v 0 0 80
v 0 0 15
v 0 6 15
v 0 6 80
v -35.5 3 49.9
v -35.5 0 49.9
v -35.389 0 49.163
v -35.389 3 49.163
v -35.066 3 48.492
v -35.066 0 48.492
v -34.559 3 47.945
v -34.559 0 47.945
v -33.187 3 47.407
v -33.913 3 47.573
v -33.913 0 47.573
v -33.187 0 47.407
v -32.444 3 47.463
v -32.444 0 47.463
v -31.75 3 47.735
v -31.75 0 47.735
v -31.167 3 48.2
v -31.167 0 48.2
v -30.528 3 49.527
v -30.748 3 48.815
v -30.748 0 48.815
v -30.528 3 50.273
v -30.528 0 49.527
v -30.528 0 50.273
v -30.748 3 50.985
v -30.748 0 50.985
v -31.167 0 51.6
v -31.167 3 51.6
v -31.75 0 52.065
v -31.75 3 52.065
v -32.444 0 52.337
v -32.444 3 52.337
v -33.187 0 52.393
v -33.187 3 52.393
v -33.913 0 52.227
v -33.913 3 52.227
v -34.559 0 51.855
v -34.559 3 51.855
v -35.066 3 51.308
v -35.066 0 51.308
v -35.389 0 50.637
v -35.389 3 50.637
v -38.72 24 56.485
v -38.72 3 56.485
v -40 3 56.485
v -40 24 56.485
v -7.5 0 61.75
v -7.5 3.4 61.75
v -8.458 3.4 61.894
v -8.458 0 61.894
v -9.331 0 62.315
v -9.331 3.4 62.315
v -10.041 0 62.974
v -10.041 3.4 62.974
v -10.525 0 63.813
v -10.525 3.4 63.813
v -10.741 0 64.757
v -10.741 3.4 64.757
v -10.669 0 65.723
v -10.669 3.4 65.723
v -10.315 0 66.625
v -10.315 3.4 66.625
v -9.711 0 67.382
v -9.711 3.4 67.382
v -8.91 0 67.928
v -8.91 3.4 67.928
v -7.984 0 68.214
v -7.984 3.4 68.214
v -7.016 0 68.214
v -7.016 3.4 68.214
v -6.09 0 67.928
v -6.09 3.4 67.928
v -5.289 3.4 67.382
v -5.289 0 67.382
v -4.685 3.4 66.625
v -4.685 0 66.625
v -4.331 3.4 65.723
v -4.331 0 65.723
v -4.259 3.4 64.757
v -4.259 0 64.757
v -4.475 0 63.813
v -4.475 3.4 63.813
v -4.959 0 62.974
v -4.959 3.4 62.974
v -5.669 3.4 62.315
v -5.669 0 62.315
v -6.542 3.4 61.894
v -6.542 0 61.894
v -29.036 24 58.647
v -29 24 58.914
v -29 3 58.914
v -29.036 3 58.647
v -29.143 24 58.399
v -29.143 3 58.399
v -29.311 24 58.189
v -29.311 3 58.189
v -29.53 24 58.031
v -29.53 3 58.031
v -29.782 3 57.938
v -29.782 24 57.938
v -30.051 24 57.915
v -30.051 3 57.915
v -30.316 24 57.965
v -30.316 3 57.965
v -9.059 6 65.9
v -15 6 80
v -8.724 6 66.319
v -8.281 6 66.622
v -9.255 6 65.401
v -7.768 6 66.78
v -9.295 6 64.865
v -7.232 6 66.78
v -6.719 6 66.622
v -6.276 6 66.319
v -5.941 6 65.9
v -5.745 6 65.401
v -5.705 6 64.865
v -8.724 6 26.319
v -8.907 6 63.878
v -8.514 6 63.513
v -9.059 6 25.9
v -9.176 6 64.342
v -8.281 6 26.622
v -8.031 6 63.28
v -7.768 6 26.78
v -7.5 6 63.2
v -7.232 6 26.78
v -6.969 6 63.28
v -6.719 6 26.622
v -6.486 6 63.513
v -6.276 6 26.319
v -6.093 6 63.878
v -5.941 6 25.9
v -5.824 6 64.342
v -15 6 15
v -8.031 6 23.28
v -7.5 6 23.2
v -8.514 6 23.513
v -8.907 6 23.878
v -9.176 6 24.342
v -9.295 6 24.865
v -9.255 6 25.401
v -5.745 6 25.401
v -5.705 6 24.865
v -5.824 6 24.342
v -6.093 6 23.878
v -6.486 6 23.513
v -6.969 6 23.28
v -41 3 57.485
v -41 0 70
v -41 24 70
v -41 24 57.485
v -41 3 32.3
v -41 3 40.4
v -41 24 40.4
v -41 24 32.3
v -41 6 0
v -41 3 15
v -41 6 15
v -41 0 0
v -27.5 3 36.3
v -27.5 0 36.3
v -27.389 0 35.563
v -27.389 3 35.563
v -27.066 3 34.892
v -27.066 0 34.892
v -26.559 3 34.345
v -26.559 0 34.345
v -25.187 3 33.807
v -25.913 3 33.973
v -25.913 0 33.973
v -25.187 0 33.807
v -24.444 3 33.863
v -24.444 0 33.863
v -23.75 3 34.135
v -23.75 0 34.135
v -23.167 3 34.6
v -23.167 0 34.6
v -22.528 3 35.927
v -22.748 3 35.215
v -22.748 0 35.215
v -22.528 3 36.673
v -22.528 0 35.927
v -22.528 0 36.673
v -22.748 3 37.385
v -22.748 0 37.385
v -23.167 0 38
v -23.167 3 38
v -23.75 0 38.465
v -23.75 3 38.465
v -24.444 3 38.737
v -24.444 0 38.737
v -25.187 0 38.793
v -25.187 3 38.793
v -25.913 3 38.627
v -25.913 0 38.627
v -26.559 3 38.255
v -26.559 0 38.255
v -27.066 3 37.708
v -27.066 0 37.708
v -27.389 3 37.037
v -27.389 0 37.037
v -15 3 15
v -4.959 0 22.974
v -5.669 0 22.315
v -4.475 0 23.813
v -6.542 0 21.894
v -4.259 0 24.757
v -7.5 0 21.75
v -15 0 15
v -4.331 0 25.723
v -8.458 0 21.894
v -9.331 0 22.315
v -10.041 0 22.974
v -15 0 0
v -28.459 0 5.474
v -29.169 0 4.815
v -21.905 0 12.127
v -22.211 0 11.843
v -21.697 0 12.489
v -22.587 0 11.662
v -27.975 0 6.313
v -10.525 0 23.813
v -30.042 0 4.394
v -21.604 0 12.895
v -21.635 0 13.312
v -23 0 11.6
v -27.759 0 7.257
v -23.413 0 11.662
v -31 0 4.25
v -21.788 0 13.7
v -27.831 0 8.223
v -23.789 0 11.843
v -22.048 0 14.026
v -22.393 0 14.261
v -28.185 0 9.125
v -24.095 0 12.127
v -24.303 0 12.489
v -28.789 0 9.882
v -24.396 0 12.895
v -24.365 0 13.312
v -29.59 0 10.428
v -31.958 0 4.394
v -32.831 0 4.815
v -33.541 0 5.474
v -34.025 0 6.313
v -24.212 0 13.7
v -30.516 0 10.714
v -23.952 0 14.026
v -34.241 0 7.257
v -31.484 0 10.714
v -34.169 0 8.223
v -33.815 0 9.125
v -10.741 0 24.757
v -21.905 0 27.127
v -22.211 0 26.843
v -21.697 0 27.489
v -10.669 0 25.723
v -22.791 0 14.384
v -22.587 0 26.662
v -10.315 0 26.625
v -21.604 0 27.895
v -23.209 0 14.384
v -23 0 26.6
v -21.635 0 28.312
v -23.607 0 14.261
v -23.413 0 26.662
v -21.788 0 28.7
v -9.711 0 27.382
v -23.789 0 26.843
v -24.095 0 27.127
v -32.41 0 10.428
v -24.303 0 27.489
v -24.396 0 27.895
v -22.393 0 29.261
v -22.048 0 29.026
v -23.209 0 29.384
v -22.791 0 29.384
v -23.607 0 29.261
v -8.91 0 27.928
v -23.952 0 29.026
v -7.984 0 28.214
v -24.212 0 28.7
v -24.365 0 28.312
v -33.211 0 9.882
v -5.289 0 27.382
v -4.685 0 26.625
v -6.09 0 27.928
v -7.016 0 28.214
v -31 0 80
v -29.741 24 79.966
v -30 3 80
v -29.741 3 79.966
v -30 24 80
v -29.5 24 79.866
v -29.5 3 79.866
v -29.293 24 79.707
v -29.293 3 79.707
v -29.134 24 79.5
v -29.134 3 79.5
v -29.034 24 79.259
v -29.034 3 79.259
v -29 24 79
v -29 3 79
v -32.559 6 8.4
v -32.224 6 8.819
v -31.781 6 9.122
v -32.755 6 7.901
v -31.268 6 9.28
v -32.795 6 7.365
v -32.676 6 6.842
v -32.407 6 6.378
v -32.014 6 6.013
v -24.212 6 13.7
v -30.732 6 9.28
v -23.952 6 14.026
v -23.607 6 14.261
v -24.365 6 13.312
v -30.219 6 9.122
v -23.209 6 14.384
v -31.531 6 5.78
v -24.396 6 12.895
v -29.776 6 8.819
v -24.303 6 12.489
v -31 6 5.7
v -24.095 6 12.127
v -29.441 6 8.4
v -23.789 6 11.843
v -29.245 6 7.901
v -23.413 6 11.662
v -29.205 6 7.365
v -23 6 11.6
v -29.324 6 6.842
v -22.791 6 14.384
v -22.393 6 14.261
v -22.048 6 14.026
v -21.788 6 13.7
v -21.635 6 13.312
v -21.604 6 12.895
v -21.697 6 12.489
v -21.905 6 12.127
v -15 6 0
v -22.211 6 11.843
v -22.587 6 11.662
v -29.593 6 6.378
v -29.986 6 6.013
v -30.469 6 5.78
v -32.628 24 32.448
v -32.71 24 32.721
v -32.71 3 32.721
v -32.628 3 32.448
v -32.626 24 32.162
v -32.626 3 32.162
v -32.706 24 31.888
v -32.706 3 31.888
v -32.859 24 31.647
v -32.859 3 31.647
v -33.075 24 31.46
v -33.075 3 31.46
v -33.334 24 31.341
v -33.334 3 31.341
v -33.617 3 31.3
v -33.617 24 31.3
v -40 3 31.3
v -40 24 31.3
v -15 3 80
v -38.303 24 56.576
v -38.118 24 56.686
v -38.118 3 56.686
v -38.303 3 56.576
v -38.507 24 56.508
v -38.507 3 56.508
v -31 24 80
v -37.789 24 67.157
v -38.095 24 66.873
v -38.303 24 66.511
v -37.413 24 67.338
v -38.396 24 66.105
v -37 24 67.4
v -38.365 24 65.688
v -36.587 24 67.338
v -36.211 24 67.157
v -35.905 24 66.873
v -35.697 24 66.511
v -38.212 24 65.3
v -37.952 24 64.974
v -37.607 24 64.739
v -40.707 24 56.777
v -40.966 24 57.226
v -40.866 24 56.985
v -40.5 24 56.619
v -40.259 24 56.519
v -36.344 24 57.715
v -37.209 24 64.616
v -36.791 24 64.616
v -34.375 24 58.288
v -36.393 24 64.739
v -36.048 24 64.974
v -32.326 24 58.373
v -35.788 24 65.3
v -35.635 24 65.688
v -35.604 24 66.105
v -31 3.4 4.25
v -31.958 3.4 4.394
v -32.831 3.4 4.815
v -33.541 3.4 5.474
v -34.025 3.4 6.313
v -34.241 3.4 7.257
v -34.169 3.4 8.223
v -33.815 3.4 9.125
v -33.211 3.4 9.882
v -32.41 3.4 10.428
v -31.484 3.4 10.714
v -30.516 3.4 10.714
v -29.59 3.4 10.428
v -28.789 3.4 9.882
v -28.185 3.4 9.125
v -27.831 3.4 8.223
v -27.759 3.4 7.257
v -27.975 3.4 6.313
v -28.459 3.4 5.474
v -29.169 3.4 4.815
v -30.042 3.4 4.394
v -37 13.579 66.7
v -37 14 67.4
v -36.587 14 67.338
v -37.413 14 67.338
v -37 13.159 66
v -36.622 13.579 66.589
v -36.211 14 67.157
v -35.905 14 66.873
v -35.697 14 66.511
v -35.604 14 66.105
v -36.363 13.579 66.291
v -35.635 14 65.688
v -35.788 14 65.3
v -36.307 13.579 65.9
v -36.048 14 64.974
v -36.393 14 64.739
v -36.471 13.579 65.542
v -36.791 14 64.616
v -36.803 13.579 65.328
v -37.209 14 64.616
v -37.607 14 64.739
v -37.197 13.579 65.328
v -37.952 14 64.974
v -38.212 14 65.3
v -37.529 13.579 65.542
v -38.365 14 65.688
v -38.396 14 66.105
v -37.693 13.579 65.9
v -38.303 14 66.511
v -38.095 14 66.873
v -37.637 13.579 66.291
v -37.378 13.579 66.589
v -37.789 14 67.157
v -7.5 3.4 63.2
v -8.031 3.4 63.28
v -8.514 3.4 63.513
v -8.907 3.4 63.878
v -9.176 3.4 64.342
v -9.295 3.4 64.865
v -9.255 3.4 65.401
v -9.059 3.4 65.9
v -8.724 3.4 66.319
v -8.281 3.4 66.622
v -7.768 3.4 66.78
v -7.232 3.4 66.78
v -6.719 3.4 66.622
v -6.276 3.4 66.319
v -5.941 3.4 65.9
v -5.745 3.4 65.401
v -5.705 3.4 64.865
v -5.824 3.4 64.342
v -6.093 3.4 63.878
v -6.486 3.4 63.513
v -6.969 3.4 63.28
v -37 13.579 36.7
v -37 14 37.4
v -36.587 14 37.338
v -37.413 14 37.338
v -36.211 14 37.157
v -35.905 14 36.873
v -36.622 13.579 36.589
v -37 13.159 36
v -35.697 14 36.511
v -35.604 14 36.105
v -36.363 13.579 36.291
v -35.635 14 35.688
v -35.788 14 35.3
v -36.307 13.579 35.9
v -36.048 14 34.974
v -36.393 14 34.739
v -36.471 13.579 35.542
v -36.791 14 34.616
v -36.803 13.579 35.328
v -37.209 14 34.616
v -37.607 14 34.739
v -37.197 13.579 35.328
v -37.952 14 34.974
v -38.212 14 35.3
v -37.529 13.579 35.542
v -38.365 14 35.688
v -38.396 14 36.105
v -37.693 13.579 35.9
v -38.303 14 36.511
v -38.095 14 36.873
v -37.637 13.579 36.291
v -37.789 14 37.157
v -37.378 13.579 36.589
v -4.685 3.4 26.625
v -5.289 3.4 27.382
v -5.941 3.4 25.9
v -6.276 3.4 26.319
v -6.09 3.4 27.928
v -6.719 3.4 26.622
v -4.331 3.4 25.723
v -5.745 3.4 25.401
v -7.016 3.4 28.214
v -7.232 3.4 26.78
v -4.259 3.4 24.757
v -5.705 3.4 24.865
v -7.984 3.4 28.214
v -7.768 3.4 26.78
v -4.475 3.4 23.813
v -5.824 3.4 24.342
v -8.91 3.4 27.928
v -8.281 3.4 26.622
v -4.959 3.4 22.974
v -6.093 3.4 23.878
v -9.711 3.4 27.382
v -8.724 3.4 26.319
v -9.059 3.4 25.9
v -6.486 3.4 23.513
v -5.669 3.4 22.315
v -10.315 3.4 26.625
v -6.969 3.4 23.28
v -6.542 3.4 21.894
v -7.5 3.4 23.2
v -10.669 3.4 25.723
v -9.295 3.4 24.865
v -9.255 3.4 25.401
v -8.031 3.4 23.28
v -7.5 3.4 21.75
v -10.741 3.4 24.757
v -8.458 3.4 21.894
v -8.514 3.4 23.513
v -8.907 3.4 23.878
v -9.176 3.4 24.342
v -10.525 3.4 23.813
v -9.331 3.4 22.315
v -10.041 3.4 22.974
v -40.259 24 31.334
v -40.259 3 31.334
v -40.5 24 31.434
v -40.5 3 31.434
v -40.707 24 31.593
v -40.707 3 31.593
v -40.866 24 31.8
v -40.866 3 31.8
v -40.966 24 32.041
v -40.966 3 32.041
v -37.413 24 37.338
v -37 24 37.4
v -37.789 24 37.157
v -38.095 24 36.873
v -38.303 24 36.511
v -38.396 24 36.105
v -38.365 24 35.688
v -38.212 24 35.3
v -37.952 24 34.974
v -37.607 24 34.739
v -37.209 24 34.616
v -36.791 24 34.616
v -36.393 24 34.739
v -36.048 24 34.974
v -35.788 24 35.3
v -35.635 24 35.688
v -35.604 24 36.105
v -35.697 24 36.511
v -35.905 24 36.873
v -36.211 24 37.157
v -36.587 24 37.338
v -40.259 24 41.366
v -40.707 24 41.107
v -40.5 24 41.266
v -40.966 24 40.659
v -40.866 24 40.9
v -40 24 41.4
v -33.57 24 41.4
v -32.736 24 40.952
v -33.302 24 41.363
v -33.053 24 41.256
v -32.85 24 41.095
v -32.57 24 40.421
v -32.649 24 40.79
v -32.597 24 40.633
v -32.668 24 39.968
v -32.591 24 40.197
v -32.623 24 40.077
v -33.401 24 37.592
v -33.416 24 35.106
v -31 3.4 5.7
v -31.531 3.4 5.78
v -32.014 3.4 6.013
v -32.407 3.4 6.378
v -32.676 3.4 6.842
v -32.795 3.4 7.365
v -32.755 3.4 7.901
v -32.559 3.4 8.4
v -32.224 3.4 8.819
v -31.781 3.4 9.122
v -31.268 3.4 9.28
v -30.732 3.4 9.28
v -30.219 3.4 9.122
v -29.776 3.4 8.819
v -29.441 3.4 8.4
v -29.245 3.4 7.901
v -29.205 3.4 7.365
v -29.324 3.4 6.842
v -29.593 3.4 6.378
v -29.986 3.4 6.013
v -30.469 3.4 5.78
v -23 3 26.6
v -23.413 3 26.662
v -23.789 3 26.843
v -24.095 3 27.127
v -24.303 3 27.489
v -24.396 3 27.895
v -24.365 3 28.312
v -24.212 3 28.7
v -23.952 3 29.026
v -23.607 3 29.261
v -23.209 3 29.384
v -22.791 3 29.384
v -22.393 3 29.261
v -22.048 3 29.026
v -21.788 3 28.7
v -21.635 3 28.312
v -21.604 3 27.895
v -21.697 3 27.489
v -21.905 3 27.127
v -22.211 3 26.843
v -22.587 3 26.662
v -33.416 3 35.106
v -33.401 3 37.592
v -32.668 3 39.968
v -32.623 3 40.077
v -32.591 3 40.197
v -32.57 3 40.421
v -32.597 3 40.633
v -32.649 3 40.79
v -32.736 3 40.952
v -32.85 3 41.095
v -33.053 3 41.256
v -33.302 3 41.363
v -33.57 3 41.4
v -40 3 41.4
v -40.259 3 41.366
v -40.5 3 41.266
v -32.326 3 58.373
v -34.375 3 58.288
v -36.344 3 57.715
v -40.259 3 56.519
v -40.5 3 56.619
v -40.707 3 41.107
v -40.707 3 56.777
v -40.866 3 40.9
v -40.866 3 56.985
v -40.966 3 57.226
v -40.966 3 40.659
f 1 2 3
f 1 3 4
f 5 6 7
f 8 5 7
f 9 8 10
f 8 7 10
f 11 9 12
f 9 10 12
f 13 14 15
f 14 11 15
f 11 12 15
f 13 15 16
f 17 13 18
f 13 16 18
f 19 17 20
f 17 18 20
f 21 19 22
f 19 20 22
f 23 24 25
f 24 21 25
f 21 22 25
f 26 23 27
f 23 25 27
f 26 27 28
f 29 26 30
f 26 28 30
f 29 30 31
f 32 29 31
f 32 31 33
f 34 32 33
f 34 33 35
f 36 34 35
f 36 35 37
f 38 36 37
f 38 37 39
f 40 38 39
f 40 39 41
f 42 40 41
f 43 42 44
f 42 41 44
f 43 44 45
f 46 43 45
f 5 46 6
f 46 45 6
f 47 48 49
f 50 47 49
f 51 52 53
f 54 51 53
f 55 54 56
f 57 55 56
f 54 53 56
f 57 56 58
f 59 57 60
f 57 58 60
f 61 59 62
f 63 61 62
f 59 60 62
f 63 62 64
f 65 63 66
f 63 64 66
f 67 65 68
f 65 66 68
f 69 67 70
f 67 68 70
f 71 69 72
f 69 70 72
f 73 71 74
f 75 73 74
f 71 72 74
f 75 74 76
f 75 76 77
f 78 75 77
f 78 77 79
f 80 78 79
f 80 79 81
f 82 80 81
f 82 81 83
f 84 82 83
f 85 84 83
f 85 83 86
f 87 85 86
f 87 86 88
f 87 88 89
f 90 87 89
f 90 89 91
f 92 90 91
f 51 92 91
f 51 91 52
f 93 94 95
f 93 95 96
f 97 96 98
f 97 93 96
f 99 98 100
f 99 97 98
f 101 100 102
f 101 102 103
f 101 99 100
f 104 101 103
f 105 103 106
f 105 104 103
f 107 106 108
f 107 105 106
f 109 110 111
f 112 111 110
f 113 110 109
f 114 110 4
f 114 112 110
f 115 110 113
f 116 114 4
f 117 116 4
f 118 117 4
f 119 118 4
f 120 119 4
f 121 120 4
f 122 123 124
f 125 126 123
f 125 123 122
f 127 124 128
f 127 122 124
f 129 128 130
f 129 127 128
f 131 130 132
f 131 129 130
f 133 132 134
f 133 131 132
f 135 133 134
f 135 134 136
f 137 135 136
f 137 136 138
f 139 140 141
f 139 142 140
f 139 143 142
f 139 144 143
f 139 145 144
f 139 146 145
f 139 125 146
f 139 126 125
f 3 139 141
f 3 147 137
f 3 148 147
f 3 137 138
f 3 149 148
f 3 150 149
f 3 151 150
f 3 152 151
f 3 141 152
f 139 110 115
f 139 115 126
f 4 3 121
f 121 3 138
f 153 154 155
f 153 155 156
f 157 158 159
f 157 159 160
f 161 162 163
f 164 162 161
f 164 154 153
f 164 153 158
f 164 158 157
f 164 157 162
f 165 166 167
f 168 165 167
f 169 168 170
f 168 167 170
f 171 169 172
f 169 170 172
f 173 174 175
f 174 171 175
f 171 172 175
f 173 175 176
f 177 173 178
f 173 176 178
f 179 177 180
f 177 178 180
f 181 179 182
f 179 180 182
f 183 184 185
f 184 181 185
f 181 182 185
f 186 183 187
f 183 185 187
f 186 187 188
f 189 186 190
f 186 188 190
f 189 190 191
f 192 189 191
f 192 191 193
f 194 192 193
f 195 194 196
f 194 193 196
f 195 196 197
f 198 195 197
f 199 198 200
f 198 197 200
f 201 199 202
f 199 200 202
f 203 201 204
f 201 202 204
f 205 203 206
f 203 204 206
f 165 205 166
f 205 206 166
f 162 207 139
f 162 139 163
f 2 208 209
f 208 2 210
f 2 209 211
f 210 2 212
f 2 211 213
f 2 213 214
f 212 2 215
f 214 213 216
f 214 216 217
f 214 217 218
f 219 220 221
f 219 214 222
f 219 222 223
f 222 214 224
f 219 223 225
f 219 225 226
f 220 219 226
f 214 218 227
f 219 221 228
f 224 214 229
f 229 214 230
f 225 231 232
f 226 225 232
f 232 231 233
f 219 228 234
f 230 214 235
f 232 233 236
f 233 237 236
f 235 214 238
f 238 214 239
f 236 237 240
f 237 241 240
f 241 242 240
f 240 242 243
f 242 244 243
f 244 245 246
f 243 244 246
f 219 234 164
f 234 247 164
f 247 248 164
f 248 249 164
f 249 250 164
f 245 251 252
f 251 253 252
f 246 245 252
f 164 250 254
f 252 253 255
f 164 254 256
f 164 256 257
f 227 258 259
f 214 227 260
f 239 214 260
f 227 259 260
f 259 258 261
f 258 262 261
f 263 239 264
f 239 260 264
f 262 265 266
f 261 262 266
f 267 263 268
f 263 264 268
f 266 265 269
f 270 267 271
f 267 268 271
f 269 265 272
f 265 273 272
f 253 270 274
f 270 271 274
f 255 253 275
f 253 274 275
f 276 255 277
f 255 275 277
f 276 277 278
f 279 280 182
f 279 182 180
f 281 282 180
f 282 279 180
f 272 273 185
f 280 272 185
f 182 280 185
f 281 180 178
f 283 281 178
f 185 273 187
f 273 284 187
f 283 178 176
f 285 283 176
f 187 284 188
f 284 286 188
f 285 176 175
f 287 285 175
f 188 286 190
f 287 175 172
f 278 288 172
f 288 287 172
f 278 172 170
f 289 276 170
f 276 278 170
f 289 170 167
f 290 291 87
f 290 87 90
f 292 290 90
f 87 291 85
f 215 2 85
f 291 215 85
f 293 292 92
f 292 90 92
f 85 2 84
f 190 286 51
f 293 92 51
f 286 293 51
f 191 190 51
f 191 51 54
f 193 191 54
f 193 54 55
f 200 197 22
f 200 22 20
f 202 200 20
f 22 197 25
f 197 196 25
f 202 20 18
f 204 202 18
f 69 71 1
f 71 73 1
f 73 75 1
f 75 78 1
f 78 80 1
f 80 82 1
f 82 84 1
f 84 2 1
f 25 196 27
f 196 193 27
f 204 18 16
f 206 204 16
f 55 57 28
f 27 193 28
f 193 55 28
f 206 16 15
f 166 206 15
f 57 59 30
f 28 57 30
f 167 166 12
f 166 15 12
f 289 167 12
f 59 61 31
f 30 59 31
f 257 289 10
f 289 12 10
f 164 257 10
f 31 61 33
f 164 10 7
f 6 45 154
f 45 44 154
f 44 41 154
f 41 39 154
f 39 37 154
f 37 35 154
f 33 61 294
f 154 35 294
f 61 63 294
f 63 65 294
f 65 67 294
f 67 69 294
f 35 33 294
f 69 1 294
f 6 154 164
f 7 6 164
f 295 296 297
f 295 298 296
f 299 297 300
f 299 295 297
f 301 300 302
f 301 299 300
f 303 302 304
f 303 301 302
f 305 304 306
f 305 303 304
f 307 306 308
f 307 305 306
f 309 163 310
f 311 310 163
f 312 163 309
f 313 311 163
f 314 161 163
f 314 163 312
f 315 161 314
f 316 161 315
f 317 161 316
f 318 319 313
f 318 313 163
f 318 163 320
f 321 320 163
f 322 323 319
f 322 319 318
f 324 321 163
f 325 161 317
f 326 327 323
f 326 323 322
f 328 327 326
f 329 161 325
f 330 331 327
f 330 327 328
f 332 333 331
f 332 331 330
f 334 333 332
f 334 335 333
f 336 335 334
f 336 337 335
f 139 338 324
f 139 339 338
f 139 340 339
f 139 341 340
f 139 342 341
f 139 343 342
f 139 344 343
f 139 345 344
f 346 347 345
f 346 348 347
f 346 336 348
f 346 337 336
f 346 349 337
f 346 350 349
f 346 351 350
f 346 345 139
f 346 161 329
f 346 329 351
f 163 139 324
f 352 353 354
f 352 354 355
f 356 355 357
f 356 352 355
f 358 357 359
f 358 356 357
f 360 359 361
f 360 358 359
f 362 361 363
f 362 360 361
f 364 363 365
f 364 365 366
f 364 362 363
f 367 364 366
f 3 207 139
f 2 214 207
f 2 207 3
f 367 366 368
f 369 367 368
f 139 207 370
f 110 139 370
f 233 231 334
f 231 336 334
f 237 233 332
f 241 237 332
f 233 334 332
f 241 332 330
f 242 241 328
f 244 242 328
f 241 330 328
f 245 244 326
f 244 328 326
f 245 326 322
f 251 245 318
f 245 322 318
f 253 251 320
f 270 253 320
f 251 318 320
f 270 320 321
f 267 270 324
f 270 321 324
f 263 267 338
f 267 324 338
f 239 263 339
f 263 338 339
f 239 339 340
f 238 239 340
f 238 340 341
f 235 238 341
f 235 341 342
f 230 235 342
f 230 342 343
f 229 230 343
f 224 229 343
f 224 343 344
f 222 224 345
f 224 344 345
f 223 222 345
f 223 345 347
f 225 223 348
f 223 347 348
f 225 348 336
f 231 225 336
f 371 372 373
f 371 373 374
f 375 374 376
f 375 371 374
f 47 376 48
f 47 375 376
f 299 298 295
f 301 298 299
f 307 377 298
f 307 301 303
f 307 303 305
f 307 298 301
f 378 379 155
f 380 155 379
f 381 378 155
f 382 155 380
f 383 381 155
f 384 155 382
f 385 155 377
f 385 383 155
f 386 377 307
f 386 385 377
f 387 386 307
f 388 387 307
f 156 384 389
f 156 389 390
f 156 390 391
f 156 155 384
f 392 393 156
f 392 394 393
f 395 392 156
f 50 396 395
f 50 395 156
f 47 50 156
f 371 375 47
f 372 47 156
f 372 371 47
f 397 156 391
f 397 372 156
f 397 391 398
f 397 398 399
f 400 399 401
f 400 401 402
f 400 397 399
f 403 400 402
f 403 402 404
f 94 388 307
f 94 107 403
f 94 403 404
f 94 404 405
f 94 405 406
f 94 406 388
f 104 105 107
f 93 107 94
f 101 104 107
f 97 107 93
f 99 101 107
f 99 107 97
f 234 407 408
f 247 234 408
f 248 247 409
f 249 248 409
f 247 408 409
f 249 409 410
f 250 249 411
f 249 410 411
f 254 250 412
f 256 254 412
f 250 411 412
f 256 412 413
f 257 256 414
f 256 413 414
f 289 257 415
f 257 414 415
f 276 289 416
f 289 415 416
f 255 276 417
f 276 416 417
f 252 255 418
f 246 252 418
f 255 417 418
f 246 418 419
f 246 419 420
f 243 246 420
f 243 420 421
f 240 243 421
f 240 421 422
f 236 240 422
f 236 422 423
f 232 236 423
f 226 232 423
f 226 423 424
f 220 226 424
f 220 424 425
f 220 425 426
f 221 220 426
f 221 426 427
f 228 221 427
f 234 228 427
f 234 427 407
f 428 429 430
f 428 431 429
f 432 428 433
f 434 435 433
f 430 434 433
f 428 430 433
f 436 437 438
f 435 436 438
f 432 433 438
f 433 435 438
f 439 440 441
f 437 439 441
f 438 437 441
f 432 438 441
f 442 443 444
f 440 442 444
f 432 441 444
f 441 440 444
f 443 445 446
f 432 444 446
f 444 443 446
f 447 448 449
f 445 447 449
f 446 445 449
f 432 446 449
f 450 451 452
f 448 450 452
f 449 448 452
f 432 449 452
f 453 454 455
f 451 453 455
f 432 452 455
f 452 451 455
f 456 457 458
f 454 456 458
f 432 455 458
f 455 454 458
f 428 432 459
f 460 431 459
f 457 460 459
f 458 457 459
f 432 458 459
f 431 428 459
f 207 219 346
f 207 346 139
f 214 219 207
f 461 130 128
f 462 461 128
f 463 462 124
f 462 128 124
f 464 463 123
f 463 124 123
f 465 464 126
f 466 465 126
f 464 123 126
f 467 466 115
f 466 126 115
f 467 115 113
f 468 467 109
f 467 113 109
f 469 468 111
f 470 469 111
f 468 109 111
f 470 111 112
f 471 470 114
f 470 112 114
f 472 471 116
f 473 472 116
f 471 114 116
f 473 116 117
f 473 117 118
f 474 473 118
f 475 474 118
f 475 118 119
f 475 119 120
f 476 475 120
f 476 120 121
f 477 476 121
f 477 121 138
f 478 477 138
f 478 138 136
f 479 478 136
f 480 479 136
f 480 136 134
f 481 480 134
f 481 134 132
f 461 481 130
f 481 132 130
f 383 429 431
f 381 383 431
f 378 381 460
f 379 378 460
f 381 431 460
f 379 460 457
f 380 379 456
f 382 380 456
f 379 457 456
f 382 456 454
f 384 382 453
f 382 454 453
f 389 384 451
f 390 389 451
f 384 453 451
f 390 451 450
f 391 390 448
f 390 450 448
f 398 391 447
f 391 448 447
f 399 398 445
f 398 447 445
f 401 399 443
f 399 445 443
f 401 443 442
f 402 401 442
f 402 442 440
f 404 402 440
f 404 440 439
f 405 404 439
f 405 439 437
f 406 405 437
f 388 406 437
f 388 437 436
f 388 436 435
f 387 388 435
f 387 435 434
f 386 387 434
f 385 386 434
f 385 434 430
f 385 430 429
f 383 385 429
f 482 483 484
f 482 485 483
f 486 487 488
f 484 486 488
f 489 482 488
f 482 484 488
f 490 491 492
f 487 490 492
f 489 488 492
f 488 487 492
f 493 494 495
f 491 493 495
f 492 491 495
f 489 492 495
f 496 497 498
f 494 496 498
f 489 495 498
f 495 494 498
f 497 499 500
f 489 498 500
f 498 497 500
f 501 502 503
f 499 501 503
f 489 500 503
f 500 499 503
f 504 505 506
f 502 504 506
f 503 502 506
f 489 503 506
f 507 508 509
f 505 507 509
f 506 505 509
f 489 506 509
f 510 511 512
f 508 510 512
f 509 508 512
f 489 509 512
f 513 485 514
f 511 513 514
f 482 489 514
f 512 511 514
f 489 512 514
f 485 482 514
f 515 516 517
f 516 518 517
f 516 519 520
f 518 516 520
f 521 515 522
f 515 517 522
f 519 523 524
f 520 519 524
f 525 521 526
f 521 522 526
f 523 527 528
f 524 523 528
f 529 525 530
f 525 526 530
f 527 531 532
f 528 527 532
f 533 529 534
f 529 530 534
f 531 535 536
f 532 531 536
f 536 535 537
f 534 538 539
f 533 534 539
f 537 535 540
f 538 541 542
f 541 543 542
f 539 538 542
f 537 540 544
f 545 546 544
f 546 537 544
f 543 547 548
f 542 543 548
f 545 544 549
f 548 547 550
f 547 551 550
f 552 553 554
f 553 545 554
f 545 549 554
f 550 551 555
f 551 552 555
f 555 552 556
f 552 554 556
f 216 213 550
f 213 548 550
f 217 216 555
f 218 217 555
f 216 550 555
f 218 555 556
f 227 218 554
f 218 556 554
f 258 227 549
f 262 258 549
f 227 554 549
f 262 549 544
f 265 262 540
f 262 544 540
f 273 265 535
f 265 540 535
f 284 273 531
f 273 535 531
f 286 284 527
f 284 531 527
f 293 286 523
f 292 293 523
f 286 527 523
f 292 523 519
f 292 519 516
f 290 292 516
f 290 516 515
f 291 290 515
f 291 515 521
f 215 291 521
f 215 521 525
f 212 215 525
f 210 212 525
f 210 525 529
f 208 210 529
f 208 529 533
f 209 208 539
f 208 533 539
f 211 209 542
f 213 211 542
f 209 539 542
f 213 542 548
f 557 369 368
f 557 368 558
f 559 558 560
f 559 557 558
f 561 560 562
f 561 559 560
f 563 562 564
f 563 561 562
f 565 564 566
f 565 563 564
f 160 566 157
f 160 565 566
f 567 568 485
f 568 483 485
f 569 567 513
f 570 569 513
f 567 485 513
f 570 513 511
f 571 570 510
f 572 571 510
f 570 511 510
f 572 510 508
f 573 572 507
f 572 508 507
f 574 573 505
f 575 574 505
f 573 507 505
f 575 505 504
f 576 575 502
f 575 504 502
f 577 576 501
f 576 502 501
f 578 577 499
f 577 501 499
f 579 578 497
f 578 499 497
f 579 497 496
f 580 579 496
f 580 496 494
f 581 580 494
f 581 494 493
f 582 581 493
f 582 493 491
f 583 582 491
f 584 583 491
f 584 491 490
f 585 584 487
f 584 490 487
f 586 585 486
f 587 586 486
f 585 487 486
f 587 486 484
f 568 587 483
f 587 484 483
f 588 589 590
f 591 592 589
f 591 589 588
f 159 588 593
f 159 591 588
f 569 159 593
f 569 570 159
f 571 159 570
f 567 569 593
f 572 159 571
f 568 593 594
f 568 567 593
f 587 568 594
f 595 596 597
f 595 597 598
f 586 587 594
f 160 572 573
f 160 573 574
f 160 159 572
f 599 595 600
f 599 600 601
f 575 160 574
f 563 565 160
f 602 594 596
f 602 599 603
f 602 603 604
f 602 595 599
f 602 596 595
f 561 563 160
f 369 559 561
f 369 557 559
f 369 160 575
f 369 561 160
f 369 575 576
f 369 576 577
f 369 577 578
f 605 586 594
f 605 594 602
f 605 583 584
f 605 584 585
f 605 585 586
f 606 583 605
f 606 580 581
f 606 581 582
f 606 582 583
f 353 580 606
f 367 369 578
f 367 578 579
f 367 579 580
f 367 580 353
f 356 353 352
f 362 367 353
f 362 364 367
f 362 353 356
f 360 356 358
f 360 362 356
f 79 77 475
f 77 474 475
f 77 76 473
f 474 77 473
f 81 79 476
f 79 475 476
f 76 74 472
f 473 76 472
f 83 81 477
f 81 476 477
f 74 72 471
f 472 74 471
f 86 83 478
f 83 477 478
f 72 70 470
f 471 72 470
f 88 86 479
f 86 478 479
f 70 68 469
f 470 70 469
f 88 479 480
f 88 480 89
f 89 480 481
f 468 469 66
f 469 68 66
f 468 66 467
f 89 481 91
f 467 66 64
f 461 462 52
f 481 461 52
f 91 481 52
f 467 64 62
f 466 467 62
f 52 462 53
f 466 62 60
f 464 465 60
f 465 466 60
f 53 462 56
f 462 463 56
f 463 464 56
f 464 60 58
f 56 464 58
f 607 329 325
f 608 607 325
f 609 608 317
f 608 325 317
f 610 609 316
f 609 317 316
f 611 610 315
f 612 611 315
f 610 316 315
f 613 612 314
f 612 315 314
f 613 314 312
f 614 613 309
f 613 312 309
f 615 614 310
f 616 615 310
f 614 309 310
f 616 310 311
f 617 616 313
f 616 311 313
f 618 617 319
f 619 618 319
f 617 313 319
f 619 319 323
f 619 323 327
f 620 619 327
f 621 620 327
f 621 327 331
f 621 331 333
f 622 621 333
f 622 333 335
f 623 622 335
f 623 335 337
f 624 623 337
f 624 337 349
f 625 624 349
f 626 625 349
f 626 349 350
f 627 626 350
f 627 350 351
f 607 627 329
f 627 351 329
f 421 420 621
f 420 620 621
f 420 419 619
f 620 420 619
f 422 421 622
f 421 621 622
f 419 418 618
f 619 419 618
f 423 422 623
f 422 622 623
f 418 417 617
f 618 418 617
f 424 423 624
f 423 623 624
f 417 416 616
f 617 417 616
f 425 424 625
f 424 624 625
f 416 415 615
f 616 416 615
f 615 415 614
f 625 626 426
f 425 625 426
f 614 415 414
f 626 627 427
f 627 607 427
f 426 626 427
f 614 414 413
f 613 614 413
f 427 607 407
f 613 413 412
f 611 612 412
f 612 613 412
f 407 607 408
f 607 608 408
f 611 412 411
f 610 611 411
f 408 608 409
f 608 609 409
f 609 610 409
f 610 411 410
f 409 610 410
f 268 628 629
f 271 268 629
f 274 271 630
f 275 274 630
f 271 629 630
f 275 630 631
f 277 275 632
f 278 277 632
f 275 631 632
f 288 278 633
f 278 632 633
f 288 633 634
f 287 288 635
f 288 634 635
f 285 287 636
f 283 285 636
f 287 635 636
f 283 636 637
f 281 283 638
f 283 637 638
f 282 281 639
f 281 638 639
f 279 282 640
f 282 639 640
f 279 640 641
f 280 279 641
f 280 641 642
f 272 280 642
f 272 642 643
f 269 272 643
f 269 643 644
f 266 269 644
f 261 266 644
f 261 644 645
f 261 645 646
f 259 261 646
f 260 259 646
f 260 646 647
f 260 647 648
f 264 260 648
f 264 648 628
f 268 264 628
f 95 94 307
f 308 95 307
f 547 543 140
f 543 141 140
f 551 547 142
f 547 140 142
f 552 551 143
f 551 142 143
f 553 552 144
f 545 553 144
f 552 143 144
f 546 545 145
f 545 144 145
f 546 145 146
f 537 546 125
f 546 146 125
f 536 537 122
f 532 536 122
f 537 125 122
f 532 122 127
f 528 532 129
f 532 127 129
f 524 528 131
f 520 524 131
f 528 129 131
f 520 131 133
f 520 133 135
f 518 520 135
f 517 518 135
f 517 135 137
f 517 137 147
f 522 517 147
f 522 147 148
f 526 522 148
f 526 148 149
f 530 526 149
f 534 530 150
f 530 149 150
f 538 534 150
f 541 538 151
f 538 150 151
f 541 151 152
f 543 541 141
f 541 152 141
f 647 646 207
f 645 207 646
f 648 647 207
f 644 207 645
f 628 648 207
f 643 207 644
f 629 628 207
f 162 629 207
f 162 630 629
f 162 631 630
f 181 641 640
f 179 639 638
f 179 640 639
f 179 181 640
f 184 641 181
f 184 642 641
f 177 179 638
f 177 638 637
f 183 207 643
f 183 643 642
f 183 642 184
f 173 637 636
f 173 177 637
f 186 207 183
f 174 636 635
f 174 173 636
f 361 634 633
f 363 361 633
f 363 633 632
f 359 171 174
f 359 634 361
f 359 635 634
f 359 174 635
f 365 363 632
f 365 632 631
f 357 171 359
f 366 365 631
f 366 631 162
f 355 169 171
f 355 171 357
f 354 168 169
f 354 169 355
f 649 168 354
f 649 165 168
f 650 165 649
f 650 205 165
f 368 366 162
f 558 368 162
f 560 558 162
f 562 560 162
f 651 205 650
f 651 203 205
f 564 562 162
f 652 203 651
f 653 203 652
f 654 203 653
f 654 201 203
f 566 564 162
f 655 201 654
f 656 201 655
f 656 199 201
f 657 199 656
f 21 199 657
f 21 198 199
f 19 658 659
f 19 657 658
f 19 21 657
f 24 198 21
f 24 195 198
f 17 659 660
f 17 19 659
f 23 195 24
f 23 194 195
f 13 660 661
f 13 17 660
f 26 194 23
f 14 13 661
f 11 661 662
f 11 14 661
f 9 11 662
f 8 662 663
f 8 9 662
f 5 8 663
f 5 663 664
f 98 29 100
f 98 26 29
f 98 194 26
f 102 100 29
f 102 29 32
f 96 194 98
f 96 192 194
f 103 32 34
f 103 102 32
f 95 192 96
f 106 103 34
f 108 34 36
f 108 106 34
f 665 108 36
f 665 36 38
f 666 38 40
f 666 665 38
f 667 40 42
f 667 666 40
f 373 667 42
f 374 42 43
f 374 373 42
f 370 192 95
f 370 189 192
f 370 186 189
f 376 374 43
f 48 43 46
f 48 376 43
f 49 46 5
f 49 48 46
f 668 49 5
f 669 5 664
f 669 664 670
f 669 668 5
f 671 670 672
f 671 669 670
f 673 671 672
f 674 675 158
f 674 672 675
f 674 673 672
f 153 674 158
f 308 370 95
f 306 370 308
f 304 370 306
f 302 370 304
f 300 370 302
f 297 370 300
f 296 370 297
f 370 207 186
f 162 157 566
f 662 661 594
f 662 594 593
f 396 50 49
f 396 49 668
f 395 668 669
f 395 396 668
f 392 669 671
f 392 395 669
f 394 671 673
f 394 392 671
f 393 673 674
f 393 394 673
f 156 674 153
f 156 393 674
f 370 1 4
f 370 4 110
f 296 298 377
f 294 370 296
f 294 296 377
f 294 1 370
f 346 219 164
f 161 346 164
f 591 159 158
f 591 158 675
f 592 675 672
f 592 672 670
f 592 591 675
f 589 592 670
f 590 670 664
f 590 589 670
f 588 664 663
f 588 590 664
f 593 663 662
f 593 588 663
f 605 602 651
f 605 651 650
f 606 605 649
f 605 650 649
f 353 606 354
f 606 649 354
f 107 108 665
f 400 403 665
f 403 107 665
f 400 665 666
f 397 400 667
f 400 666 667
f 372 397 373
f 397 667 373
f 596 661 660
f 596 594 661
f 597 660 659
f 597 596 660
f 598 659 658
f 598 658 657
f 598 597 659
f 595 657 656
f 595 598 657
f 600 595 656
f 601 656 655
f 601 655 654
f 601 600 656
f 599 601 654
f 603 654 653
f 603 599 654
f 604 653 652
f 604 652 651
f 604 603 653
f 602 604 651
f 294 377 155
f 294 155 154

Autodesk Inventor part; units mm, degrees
ref_plane "YZ Plane" through (0, 0, 0) normal (1, 0, 0) x (0, 1, 0)
ref_plane "XZ Plane" through (0, 0, 0) normal (0, 1, 0) x (-1, 0, 0)
ref_plane "XY Plane" through (0, 0, 0) normal (0, 0, 1) x (1, 0, 0)
sketch "Sketch1" plane through (0, 0, 0) normal (0, 1, 0) x (-1, 0, 0)
  circle A0 centre (25, 36.3) radius 2.5
  circle A1 centre (33, 49.9) radius 2.5
  line L0 (15, 0) -> (15, 15)
  line L1 (15, 15) -> (0, 15)
  line L2 (0, 15) -> (0, 80)
  line L3 (0, 80) -> (41, 80)
  line L4 (41, 80) -> (41, 0)
  line L5 (15, 0) -> (41, 0)
  circle A2 centre (25, 36.3) radius 7.5 construction
  circle A3 centre (33, 49.9) radius 7.5 construction
  point P0 (0, 0)
  dimension "d0" = 5
  dimension "d1" = 15
  dimension "d2" = 25
  dimension "d3" = 21.3
  dimension "d4" = 8
  dimension "d5" = 13.6
  dimension "d12" = 15
  dimension "d46" = 80
  dimension "d47" = 41
extrude "Extrusion1" add sketch "Sketch1" along normal blind 3
sketch "Sketch2" plane through (0, 3, 0) normal (0, 1, 0) x (1, 0, 0)
  line L0 (-41, 0) -> (-41, -80) projected
  line L1 (-41, -80) -> (0, -80) projected
  line L2 (0, -80) -> (0, -15) projected
  line L3 (0, -15) -> (-15, -15) projected
  line L4 (-15, -15) -> (-15, 0) projected
  line L5 (-15, 0) -> (-41, 0) projected
  circle A0 centre (-33, -49.9) radius 2.5 projected
  circle A1 centre (-25, -36.3) radius 2.5 projected
  line L6 (-15, -15) -> (-15, 0) projected
  line L7 (-15, -15) -> (-15, -80)
  line L8 (-15, -15) -> (-41, -15)
  line L9 (-41, 0) -> (-41, -80) projected
  point P0 (0, 0)
extrude "Extrusion2" add sketch "Sketch2" along normal blind 3 contours L5 L4 L8 L0 | L3 L2 L1 L7
sketch "Sketch3" plane through (0, 3, 0) normal (0, 1, 0) x (1, 0, 0)
  circle A0 centre (-25, -36.3) radius 2.5 projected
  circle A1 centre (-33, -49.9) radius 2.5 projected
  line L0 (-15, -80) -> (-15, -15) projected
  line L1 (-15, -15) -> (-41, -15) projected
  line L2 (-41, -15) -> (-41, -80) projected
  line L3 (-41, -80) -> (-15, -80) projected
  circle A2 centre (-25, -36.3) radius 2.5 projected
  circle A3 centre (-25, -36.3) radius 8.5
  circle A4 centre (-33, -49.9) radius 2.5 projected
  circle A5 centre (-33, -49.9) radius 8.5
  line L4 (-31.8739, -31.3) -> (-41, -31.3)
  line L5 (-41, 0) -> (-41, -80) projected
  line L6 (-33, -41.4) -> (-41, -41.4)
  line L7 (-38.3753, -56.4846) -> (-41, -56.4846)
  line L8 (-29, -57.4) -> (-29, -80)
  line L9 (-41, -80) -> (0, -80) projected
  point P0 (0, 0)
  point P1 (-31.727, -41.4959)
  dimension "d15" = 17
  dimension "d16" = 5
  dimension "d19" = 12
extrude "Extrusion3" add sketch "Sketch3" along normal blind 21 contours L3 L2 L7 A5 L8 | L4 A3 A5 L6 L2
fillet "Fillet1" radius 1 8 edges at (-31.8739, 13.5, 31.3) (-31.727, 13.5, 41.4959) (-41, 13.5, 41.4) (-41, 13.5, 31.3) (-41, 13.5, 56.4846) (-29, 13.5, 57.4) (-29, 13.5, 80) (-38.3753, 13.5, 56.4846)
chamfer "Chamfer1" distance 10 angle 45 1 edges at (-41, 12, 80)
sketch "Sketch4" plane through (0, 24, 0) normal (0, 1, 0) x (1, 0, 0)
  line L0 (-31, -80) -> (-41, -70) projected
  line L1 (-31, -80) -> (-30, -80) projected
  arc A0 (-30, -80) -> (-29, -79) centre (-30, -79) ccw projected
  line L2 (-29, -79) -> (-29, -58.9139) projected
  arc A1 (-29, -58.9139) -> (-30.3158, -57.965) centre (-30, -58.9139) ccw projected
  arc A2 (-38.1184, -56.6862) -> (-30.3158, -57.965) centre (-33, -49.9) ccw projected
  arc A3 (-38.1184, -56.6862) -> (-38.7205, -56.4846) centre (-38.7205, -57.4846) ccw projected
  line L3 (-38.7205, -56.4846) -> (-40, -56.4846) projected
  arc A4 (-40, -56.4846) -> (-41, -57.4846) centre (-40, -57.4846) ccw projected
  line L4 (-41, -57.4846) -> (-41, -70) projected
  arc A5 (-40, -31.3) -> (-41, -32.3) centre (-40, -32.3) ccw projected
  line L5 (-41, -32.3) -> (-41, -40.4) projected
  arc A6 (-41, -40.4) -> (-40, -41.4) centre (-40, -40.4) ccw projected
  line L6 (-40, -41.4) -> (-33.5697, -41.4) projected
  arc A7 (-33.5697, -41.4) -> (-32.6676, -39.9684) centre (-33.5697, -40.4) ccw projected
  arc A8 (-32.7098, -32.7211) -> (-32.6676, -39.9684) centre (-25, -36.3) ccw projected
  arc A9 (-32.7098, -32.7211) -> (-33.6168, -31.3) centre (-33.6168, -32.3) ccw projected
  line L7 (-33.6168, -31.3) -> (-40, -31.3) projected
  point P0 (0, 0)
  point P1 (-37, -36)
  point P2 (-37, -66)
  dimension "d24" = 4
  dimension "d25" = 36
  dimension "d26" = 30
hole "Hole1" at (-37, 24, 36) at (-37, 24, 66) direction (0, -1, 0) diameter 2.8 depth 10 tip angle 118
sketch "Sketch5" plane through (0, 0, 0) normal (0, -1, 0) x (1, 0, 0)
  line L0 (-41, 70) -> (-31, 80) projected
  line L1 (-41, 0) -> (-41, 70) projected
  line L2 (-15, 0) -> (-41, 0) projected
  line L3 (-15, 15) -> (-15, 0) projected
  line L4 (0, 15) -> (-15, 15) projected
  line L5 (0, 80) -> (0, 15) projected
  line L6 (-31, 80) -> (0, 80) projected
  circle A0 centre (-33, 49.9) radius 2.5 projected
  circle A1 centre (-25, 36.3) radius 2.5 projected
  point P0 (0, 0)
  point P1 (-31, 7.5)
  point P2 (-7.5, 25)
  point P3 (-7.5, 65)
  dimension "d34" = 7.5
  dimension "d35" = 7.5
  dimension "d36" = 10
  dimension "d37" = 15
  dimension "d38" = 40
hole "Hole2" at (-31, 0, 7.5) at (-7.5, 0, 25) at (-7.5, 0, 65) direction (0, 1, 0) diameter 3.6 end through all counterbore diameter 6.5 counterbore depth 3.4 clearance for "Socket Head Cap Screw ISO 4762" size "M3" standard "ISO"
sketch "Sketch6" plane through (0, 0, 0) normal (0, -1, 0) x (1, 0, 0)
  circle A0 centre (-7.5, 25) radius 3.25 projected
  circle A1 centre (-31, 7.5) radius 3.25 projected
  circle A2 centre (-7.5, 65) radius 3.25 projected
  line L0 (-41, 70) -> (-31, 80) projected
  line L1 (-41, 0) -> (-41, 70) projected
  line L2 (-15, 0) -> (-41, 0) projected
  line L3 (-15, 15) -> (-15, 0) projected
  line L4 (0, 15) -> (-15, 15) projected
  line L5 (0, 80) -> (0, 15) projected
  line L6 (-31, 80) -> (0, 80) projected
  circle A3 centre (-33, 49.9) radius 2.5 projected
  circle A4 centre (-25, 36.3) radius 2.5 projected
  point P0 (0, 0)
  point P1 (-23, 13)
  point P2 (-23, 28)
  dimension "d48" = 15
  dimension "d49" = 8
  dimension "d50" = 13
hole "Hole3" at (-23, 0, 13) at (-23, 0, 28) direction (0, 1, 0) diameter 2.8 end through all
equation "\"d35\" = d34"
properties part number "Alpha Idler Assembly" material "ABS Plastic"
